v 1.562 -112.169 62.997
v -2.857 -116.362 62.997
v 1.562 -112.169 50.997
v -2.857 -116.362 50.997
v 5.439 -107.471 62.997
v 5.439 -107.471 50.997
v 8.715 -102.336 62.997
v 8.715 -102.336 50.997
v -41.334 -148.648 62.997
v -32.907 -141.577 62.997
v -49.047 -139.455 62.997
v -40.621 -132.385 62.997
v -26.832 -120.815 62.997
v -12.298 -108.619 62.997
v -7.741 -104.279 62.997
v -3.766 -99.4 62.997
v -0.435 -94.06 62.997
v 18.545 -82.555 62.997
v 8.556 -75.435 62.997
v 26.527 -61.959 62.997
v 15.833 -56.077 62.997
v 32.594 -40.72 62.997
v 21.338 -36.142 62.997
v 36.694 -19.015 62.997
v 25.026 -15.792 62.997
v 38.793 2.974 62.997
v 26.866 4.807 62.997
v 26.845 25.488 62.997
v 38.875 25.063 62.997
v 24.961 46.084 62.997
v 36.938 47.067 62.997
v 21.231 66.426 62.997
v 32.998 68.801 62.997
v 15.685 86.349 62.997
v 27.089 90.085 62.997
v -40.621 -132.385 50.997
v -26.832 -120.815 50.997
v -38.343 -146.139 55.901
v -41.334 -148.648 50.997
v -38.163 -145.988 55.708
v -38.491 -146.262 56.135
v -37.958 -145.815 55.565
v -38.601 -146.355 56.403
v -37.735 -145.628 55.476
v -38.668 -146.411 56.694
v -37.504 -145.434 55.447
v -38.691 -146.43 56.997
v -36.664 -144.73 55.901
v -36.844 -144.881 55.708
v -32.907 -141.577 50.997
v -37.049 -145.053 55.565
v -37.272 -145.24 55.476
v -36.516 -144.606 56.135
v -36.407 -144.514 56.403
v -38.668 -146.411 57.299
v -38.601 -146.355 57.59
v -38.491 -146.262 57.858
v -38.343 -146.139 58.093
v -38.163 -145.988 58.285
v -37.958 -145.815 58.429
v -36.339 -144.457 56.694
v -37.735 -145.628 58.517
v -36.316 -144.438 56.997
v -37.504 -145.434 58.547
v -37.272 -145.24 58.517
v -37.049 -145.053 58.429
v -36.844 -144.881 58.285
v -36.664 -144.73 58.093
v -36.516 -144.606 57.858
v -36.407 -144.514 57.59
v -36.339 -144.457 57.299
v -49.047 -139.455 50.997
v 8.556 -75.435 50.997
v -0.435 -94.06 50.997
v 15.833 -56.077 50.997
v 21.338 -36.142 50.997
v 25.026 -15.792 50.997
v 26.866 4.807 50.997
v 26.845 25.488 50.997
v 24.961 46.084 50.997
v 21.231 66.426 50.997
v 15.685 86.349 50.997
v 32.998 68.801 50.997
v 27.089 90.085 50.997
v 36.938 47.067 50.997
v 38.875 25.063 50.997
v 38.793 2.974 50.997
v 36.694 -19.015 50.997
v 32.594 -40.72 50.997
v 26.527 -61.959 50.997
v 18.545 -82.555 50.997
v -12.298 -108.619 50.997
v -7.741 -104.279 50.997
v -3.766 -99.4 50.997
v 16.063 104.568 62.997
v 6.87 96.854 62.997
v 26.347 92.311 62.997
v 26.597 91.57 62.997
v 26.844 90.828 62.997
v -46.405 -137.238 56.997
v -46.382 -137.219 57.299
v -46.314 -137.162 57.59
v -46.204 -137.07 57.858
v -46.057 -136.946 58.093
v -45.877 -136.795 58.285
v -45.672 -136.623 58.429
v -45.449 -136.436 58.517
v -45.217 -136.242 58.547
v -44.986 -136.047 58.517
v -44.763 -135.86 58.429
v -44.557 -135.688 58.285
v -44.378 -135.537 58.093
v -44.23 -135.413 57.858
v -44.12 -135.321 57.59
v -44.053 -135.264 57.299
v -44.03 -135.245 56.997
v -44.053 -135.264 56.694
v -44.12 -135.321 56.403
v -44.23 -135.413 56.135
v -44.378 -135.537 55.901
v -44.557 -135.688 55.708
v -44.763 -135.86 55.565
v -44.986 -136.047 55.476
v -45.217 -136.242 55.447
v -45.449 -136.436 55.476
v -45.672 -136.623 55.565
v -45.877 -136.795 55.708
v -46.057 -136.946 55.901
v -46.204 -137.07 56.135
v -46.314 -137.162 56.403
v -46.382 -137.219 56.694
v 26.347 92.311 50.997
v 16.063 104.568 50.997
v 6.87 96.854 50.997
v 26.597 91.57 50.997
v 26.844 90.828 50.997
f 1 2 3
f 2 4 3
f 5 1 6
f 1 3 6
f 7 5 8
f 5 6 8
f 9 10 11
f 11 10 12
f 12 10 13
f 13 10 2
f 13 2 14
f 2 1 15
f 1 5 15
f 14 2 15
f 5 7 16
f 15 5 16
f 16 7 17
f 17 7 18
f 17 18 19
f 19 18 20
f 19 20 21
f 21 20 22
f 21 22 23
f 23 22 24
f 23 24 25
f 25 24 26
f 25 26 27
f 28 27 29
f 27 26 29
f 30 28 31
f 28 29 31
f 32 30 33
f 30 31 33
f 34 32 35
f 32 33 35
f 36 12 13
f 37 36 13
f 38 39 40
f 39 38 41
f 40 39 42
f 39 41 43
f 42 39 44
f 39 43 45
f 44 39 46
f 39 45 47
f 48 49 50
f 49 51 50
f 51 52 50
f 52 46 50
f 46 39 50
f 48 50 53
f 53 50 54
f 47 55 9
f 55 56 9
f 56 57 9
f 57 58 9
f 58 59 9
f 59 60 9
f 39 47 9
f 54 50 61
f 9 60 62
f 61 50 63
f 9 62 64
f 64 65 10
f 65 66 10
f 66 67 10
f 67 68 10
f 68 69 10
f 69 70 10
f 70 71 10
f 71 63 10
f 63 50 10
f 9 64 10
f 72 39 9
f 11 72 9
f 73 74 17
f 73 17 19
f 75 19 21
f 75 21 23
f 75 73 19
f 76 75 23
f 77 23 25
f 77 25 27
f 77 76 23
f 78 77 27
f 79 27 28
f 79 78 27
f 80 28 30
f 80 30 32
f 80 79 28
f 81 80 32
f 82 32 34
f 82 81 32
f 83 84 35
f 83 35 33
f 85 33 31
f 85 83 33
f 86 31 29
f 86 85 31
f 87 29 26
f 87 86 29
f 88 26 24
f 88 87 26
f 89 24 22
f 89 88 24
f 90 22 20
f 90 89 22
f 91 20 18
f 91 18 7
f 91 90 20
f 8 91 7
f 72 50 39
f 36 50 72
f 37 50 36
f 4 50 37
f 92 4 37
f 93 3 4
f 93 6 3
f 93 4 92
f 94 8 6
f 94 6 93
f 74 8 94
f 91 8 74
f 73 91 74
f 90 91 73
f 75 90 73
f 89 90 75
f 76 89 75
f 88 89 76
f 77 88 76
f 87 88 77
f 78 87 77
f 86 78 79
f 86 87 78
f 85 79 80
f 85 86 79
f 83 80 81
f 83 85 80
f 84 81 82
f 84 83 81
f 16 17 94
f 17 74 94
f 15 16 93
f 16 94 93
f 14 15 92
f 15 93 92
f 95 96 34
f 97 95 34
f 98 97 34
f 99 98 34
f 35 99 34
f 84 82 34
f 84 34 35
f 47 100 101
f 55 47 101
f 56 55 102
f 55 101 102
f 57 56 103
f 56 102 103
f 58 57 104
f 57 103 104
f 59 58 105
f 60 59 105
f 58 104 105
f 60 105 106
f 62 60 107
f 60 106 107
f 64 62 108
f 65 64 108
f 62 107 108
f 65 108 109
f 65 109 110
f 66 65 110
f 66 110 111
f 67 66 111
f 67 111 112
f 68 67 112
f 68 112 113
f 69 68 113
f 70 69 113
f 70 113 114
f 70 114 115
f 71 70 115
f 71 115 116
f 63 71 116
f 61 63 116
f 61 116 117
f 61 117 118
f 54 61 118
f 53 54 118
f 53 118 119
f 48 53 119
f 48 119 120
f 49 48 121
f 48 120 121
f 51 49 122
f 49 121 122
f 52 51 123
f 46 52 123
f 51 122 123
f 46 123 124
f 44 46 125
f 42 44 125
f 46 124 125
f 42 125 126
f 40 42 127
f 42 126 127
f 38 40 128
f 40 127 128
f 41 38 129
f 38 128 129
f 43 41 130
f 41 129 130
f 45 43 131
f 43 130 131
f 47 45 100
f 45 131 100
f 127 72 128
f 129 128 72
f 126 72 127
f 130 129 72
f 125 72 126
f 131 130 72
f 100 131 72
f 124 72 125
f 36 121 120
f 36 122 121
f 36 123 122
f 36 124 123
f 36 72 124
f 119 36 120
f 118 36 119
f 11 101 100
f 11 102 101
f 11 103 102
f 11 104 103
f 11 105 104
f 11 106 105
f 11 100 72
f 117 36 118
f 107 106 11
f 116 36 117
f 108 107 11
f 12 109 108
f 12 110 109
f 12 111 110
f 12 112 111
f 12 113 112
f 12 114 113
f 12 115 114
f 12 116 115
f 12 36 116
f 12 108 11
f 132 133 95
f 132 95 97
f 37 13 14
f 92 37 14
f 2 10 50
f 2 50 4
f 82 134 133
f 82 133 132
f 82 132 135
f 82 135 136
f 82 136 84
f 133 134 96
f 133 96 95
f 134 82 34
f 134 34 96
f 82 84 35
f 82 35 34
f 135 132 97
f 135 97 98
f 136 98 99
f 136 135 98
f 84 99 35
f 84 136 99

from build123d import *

# Parameters (mm, degrees)
AUFSATZ_LINEAR_AUSTRAGEN1_DEPTH    = 12
AUFSATZ_LINEAR_AUSTRAGEN3_DEPTH    = 12
AUFSATZ_LINEAR_AUSTRAGEN4_DEPTH    = 12
SCHNITT_LINEAR_AUSTRAGEN1_DEPTH    = 254.175024926
VERRUNDUNG1_R                      = 50
SKIZZE9_W                          = 12
SKIZZE9_H                          = 12
AUFSATZ_LINEAR_AUSTRAGEN6_DEPTH    = 11
SKIZZE11_R                         = 1.55
SCHNITT_LINEAR_AUSTRAGEN4_DEPTH    = 222.40836864
K_RPER_VERSCHIEBEN_KOPIEREN2_ANGLE = 120


with BuildPart() as part:
    # Skizze1 → Aufsatz-Linear austragen1 (new body)
    with BuildSketch(Plane(origin=(0, 0, 0), x_dir=(0, 0, -1), z_dir=(1, 0, 0))):
        with BuildLine():
            Line((-240, 65), (-230.735708163, 72.773663864))
            ThreePointArc((-230.735708163, 72.773663864), (-123.944567763, 17.242039243), (-3.735818811, 23.403668612))
            Line((-3.735818811, 23.403668612), (0, 12))
            ThreePointArc((0, 12), (-127.247502729, 5.681119716), (-240, 65))
        make_face()
    extrude(amount=AUFSATZ_LINEAR_AUSTRAGEN1_DEPTH)

    # Skizze5 → Aufsatz-Linear austragen4 (add)
    with BuildSketch(Plane(origin=(12, 0, 0), x_dir=(0, 0, -1), z_dir=(1, 0, 0))):
        Polygon((-231.662517154, 71.995978781), (-222.469983836, 79.709430098), (-210.899806862, 65.920630121), (-192.948331238, 44.526894555), (-220.092340179, 58.207178805), align=None)
    extrude(amount=-AUFSATZ_LINEAR_AUSTRAGEN4_DEPTH)

    # Skizze6 → Schnitt-Linear austragen1 (cut, through all)
    with BuildSketch(Plane(origin=(12, 0, 0), x_dir=(0, 0, -1), z_dir=(1, 0, 0))):
        Polygon((-231.662517154, 71.995978781), (-199.510648028, 33.678873242), (-204.367668784, 29.603348917), (-240, 65), align=None)
    extrude(amount=-SCHNITT_LINEAR_AUSTRAGEN1_DEPTH, mode=Mode.SUBTRACT)

    # Verrundung1
    verrundung1_edges = [part.edges().sort_by_distance(p)[0] for p in [
        (6, 44.526894555, 192.948331238),
        (6, 35.285406895, 200.858689823),
    ]]
    fillet(verrundung1_edges, radius=VERRUNDUNG1_R)

    # Skizze9 → Aufsatz-Linear austragen6 (add)
    with BuildSketch(Plane(origin=(0, 156.320496136, 131.168470653), x_dir=(1, 0, 0), z_dir=(0, 0.7660444431189836, 0.6427876096865328))):
        with Locations((6, -125.185660837)):
            Rectangle(SKIZZE9_W, SKIZZE9_H)
    extrude(amount=AUFSATZ_LINEAR_AUSTRAGEN6_DEPTH)

    # Skizze11 → Schnitt-Linear austragen4 (cut, through all)
    with BuildSketch(Plane(origin=(0, -76.611066038, 91.301513183), x_dir=(-1, 0, 0), z_dir=(0, 0.6427876096865329, -0.7660444431189836))):
        with Locations(Location((-6, 210.061915128, 0), (0, 0, 90))):
            Circle(SKIZZE11_R)
    extrude(amount=-SCHNITT_LINEAR_AUSTRAGEN4_DEPTH, mode=Mode.SUBTRACT)


with BuildPart() as body_2:
    # Skizze4 → Aufsatz-Linear austragen3 (new body)
    with BuildSketch(Plane(origin=(0, 0, 0), x_dir=(0, 0, -1), z_dir=(1, 0, 0))):
        with BuildLine():
            Line((-3.735818811, 23.403668612), (6.769031275, 32.218284445))
            Line((6.769031275, 32.218284445), (14.482482591, 23.025751128))
            Line((14.482482591, 23.025751128), (2.225771501, 12.741149373))
            ThreePointArc((2.225771501, 12.741149373), (1.113785782, 12.367871772), (0, 12))
            Line((0, 12), (-3.735818811, 23.403668612))
        make_face()
    extrude(amount=AUFSATZ_LINEAR_AUSTRAGEN3_DEPTH)


with BuildPart() as part_1:
    # Körper-Verschieben/Kopieren2: moved
    add(part.part.rotate(Axis((-3.969359472, 43.057910326, 47.027269798), (0.5773502691896252, -0.5773502691896272, 0.5773502691896252)), K_RPER_VERSCHIEBEN_KOPIEREN2_ANGLE))


with BuildPart() as body_2_1:
    # Körper-Verschieben/Kopieren2: moved
    add(body_2.part.rotate(Axis((-3.969359472, 43.057910326, 47.027269798), (0.5773502691896252, -0.5773502691896272, 0.5773502691896252)), K_RPER_VERSCHIEBEN_KOPIEREN2_ANGLE))


solid = Compound([part_1.part, body_2_1.part])
